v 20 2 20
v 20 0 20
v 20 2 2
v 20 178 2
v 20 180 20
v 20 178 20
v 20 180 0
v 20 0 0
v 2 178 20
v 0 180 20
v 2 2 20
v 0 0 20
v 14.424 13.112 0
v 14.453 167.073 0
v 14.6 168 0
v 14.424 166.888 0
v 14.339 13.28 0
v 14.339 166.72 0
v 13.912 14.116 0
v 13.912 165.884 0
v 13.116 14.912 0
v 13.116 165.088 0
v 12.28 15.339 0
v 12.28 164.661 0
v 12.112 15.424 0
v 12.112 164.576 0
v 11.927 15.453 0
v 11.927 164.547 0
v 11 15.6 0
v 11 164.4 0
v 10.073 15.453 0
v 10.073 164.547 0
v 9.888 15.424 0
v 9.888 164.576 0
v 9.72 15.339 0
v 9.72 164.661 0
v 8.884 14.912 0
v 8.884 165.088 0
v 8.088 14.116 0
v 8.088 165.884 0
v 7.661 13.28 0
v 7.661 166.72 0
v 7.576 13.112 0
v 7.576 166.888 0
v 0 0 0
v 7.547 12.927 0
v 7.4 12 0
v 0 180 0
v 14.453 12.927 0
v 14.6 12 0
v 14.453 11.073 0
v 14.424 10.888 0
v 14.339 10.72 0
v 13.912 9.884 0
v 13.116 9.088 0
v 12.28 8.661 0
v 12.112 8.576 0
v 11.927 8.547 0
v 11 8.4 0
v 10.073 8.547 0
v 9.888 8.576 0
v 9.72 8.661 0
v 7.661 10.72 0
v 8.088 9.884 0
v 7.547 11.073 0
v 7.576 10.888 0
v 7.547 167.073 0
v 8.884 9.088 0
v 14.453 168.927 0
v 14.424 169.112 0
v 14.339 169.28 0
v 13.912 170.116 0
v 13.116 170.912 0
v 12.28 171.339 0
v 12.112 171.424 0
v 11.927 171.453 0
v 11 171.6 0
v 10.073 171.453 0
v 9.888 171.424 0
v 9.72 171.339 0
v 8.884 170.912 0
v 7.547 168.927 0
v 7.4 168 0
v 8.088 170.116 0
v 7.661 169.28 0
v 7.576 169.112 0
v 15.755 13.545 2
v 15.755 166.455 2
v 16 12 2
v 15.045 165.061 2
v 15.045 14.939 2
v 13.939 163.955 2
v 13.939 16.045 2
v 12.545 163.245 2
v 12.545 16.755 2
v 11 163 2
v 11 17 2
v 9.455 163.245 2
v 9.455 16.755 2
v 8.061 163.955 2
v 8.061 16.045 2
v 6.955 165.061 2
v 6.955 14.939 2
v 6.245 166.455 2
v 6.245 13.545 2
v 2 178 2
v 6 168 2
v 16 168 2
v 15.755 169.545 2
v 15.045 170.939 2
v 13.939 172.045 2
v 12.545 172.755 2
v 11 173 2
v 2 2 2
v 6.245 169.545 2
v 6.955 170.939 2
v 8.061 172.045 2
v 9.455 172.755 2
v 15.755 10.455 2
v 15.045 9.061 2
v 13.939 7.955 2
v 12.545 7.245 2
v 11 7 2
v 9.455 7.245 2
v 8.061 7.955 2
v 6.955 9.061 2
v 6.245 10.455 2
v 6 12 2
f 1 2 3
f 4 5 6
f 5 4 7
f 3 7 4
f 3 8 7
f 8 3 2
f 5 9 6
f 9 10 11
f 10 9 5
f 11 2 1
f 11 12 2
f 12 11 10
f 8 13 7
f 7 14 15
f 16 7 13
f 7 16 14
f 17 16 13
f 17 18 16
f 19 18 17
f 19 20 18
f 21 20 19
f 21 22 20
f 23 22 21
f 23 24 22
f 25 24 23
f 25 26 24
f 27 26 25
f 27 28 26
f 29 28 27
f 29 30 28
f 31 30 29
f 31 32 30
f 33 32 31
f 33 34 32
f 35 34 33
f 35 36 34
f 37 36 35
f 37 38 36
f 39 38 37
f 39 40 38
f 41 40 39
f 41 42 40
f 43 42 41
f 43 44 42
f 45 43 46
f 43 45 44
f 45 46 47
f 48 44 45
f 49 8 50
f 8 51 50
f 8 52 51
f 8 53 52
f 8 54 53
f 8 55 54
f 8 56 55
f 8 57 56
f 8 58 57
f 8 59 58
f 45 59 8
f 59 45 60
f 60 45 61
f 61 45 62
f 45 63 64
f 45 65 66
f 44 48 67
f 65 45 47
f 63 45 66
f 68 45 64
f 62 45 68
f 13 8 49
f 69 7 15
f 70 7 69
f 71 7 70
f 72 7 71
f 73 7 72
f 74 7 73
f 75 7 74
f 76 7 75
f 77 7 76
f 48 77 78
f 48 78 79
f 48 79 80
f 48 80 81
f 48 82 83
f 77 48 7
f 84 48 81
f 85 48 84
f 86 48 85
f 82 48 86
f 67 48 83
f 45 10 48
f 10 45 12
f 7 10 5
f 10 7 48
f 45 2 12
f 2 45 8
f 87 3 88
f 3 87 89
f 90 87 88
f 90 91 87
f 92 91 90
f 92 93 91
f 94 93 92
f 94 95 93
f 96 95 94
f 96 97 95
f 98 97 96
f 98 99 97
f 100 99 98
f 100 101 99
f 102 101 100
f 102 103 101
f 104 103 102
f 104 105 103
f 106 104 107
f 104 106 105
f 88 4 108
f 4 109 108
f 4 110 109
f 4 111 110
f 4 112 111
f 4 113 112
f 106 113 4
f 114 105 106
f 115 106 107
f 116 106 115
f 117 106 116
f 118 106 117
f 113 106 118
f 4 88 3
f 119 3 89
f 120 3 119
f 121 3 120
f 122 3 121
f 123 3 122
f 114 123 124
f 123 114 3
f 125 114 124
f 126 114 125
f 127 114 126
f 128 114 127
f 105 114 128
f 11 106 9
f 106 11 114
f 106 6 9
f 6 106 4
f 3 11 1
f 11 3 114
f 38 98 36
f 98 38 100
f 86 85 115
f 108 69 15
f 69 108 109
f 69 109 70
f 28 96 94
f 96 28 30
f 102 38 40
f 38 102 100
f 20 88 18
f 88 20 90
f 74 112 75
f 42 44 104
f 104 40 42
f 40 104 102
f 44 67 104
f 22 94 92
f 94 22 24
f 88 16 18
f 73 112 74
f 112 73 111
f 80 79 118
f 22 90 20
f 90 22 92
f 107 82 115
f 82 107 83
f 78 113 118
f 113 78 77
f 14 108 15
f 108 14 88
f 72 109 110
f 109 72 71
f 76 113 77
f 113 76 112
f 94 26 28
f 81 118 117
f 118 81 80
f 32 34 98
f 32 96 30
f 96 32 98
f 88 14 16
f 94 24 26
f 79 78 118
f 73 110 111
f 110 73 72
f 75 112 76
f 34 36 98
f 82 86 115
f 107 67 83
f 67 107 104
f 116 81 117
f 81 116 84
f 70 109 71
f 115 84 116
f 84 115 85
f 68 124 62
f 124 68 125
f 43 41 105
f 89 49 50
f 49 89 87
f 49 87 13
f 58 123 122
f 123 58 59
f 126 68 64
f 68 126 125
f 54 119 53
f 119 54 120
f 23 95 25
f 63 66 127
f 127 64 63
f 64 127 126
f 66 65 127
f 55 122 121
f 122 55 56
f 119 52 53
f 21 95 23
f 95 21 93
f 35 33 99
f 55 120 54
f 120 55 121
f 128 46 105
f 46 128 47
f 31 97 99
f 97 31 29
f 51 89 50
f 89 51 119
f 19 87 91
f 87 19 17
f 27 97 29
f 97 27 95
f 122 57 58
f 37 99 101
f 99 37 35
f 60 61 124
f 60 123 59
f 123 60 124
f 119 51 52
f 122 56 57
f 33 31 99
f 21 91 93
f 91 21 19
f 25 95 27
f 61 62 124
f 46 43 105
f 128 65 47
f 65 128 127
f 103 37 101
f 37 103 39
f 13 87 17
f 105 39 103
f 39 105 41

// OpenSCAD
// file: ../../../assets/components/fastener_holes.scad
/*
    Intended to make space for a fastener.

    parameters:
    -head           a vector [head length, head radius]
    -bore           a vector [bore length, bore radius]
    -countersink    countersink length, requires head radius and bore radius
*/

module fastener_hole(
    head = [0, 5],
    bore = [0, 3],
    countersink = 5
) {
    if (head[0] && head[1])
    cylinder(h = head[0], r = head[1], center = false);
    translate([0,0,-countersink]) {
        if (countersink)
        cylinder(h = countersink, r1 = bore[1], r2 = head[1], center = false);

        translate([0,0,-bore[0]]) {
            if (bore[0] && bore[1])
            cylinder(h = bore[0], r = bore[1], center = false);
        }
    }
}

module fastener_block(
    size,
    head = [0, 0],
    bore = [0, 0],
    countersink = 0
) {

    fastener_hole(head = head, bore = bore, countersink = countersink);
    translate([size.x, 0])
    fastener_hole(head = head, bore = bore, countersink = countersink);
    translate([size.x, size.y])
    fastener_hole(head = head, bore = bore, countersink = countersink);
    translate([0, size.y])
    fastener_hole(head = head, bore = bore, countersink = countersink);

}

module fastener_radial(
    radius,
    amount,
    head = [0, 6],
    bore = [0, 3],
    countersink = 5
) {
    step = 360 / amount;
    for(i = [0:amount]){
        rotate(i * step, [0,0,1])
        translate([radius,0,0]) 
        fastener_hole(head=head, bore=bore, countersink=countersink);
    }
}

// showcase
fastener_hole(
    head = [3,5],
    bore = [7,2],
    countersink = 3
);

translate([100, 0, 0]) 
fastener_block(
    size = [20, 40],
    head = [3, 5],
    bore = [10, 2],
    countersink = 0
);

translate([-150, 0, 0]) 
fastener_radial(
    radius = 50,
    amount = 8,
    head = [0, 7],
    bore = [0, 3],
    countersink = 5
);
// main file
use <../../../assets/components/fastener_holes.scad>


module barrier(l, h, thickness, fastener_r) {
    difference() {
        #difference() {
            cube(size = [h,l,h]);
            translate([thickness, thickness , thickness])
            cube(size = [h,l - thickness * 2,h]);
        }
        translate([(h + thickness ) / 2,0,thickness])
        union() {
            translate([0, l - (h / 2 + thickness), 0])
            fastener_hole(bore = [thickness, fastener_r]);

            translate([0, h / 2 + thickness, 0])
            fastener_hole(bore = [thickness, fastener_r]);
        }
    }

}

barrier($fn = 20, l = 180, h = 20, thickness = 2, fastener_r = 1.5);
